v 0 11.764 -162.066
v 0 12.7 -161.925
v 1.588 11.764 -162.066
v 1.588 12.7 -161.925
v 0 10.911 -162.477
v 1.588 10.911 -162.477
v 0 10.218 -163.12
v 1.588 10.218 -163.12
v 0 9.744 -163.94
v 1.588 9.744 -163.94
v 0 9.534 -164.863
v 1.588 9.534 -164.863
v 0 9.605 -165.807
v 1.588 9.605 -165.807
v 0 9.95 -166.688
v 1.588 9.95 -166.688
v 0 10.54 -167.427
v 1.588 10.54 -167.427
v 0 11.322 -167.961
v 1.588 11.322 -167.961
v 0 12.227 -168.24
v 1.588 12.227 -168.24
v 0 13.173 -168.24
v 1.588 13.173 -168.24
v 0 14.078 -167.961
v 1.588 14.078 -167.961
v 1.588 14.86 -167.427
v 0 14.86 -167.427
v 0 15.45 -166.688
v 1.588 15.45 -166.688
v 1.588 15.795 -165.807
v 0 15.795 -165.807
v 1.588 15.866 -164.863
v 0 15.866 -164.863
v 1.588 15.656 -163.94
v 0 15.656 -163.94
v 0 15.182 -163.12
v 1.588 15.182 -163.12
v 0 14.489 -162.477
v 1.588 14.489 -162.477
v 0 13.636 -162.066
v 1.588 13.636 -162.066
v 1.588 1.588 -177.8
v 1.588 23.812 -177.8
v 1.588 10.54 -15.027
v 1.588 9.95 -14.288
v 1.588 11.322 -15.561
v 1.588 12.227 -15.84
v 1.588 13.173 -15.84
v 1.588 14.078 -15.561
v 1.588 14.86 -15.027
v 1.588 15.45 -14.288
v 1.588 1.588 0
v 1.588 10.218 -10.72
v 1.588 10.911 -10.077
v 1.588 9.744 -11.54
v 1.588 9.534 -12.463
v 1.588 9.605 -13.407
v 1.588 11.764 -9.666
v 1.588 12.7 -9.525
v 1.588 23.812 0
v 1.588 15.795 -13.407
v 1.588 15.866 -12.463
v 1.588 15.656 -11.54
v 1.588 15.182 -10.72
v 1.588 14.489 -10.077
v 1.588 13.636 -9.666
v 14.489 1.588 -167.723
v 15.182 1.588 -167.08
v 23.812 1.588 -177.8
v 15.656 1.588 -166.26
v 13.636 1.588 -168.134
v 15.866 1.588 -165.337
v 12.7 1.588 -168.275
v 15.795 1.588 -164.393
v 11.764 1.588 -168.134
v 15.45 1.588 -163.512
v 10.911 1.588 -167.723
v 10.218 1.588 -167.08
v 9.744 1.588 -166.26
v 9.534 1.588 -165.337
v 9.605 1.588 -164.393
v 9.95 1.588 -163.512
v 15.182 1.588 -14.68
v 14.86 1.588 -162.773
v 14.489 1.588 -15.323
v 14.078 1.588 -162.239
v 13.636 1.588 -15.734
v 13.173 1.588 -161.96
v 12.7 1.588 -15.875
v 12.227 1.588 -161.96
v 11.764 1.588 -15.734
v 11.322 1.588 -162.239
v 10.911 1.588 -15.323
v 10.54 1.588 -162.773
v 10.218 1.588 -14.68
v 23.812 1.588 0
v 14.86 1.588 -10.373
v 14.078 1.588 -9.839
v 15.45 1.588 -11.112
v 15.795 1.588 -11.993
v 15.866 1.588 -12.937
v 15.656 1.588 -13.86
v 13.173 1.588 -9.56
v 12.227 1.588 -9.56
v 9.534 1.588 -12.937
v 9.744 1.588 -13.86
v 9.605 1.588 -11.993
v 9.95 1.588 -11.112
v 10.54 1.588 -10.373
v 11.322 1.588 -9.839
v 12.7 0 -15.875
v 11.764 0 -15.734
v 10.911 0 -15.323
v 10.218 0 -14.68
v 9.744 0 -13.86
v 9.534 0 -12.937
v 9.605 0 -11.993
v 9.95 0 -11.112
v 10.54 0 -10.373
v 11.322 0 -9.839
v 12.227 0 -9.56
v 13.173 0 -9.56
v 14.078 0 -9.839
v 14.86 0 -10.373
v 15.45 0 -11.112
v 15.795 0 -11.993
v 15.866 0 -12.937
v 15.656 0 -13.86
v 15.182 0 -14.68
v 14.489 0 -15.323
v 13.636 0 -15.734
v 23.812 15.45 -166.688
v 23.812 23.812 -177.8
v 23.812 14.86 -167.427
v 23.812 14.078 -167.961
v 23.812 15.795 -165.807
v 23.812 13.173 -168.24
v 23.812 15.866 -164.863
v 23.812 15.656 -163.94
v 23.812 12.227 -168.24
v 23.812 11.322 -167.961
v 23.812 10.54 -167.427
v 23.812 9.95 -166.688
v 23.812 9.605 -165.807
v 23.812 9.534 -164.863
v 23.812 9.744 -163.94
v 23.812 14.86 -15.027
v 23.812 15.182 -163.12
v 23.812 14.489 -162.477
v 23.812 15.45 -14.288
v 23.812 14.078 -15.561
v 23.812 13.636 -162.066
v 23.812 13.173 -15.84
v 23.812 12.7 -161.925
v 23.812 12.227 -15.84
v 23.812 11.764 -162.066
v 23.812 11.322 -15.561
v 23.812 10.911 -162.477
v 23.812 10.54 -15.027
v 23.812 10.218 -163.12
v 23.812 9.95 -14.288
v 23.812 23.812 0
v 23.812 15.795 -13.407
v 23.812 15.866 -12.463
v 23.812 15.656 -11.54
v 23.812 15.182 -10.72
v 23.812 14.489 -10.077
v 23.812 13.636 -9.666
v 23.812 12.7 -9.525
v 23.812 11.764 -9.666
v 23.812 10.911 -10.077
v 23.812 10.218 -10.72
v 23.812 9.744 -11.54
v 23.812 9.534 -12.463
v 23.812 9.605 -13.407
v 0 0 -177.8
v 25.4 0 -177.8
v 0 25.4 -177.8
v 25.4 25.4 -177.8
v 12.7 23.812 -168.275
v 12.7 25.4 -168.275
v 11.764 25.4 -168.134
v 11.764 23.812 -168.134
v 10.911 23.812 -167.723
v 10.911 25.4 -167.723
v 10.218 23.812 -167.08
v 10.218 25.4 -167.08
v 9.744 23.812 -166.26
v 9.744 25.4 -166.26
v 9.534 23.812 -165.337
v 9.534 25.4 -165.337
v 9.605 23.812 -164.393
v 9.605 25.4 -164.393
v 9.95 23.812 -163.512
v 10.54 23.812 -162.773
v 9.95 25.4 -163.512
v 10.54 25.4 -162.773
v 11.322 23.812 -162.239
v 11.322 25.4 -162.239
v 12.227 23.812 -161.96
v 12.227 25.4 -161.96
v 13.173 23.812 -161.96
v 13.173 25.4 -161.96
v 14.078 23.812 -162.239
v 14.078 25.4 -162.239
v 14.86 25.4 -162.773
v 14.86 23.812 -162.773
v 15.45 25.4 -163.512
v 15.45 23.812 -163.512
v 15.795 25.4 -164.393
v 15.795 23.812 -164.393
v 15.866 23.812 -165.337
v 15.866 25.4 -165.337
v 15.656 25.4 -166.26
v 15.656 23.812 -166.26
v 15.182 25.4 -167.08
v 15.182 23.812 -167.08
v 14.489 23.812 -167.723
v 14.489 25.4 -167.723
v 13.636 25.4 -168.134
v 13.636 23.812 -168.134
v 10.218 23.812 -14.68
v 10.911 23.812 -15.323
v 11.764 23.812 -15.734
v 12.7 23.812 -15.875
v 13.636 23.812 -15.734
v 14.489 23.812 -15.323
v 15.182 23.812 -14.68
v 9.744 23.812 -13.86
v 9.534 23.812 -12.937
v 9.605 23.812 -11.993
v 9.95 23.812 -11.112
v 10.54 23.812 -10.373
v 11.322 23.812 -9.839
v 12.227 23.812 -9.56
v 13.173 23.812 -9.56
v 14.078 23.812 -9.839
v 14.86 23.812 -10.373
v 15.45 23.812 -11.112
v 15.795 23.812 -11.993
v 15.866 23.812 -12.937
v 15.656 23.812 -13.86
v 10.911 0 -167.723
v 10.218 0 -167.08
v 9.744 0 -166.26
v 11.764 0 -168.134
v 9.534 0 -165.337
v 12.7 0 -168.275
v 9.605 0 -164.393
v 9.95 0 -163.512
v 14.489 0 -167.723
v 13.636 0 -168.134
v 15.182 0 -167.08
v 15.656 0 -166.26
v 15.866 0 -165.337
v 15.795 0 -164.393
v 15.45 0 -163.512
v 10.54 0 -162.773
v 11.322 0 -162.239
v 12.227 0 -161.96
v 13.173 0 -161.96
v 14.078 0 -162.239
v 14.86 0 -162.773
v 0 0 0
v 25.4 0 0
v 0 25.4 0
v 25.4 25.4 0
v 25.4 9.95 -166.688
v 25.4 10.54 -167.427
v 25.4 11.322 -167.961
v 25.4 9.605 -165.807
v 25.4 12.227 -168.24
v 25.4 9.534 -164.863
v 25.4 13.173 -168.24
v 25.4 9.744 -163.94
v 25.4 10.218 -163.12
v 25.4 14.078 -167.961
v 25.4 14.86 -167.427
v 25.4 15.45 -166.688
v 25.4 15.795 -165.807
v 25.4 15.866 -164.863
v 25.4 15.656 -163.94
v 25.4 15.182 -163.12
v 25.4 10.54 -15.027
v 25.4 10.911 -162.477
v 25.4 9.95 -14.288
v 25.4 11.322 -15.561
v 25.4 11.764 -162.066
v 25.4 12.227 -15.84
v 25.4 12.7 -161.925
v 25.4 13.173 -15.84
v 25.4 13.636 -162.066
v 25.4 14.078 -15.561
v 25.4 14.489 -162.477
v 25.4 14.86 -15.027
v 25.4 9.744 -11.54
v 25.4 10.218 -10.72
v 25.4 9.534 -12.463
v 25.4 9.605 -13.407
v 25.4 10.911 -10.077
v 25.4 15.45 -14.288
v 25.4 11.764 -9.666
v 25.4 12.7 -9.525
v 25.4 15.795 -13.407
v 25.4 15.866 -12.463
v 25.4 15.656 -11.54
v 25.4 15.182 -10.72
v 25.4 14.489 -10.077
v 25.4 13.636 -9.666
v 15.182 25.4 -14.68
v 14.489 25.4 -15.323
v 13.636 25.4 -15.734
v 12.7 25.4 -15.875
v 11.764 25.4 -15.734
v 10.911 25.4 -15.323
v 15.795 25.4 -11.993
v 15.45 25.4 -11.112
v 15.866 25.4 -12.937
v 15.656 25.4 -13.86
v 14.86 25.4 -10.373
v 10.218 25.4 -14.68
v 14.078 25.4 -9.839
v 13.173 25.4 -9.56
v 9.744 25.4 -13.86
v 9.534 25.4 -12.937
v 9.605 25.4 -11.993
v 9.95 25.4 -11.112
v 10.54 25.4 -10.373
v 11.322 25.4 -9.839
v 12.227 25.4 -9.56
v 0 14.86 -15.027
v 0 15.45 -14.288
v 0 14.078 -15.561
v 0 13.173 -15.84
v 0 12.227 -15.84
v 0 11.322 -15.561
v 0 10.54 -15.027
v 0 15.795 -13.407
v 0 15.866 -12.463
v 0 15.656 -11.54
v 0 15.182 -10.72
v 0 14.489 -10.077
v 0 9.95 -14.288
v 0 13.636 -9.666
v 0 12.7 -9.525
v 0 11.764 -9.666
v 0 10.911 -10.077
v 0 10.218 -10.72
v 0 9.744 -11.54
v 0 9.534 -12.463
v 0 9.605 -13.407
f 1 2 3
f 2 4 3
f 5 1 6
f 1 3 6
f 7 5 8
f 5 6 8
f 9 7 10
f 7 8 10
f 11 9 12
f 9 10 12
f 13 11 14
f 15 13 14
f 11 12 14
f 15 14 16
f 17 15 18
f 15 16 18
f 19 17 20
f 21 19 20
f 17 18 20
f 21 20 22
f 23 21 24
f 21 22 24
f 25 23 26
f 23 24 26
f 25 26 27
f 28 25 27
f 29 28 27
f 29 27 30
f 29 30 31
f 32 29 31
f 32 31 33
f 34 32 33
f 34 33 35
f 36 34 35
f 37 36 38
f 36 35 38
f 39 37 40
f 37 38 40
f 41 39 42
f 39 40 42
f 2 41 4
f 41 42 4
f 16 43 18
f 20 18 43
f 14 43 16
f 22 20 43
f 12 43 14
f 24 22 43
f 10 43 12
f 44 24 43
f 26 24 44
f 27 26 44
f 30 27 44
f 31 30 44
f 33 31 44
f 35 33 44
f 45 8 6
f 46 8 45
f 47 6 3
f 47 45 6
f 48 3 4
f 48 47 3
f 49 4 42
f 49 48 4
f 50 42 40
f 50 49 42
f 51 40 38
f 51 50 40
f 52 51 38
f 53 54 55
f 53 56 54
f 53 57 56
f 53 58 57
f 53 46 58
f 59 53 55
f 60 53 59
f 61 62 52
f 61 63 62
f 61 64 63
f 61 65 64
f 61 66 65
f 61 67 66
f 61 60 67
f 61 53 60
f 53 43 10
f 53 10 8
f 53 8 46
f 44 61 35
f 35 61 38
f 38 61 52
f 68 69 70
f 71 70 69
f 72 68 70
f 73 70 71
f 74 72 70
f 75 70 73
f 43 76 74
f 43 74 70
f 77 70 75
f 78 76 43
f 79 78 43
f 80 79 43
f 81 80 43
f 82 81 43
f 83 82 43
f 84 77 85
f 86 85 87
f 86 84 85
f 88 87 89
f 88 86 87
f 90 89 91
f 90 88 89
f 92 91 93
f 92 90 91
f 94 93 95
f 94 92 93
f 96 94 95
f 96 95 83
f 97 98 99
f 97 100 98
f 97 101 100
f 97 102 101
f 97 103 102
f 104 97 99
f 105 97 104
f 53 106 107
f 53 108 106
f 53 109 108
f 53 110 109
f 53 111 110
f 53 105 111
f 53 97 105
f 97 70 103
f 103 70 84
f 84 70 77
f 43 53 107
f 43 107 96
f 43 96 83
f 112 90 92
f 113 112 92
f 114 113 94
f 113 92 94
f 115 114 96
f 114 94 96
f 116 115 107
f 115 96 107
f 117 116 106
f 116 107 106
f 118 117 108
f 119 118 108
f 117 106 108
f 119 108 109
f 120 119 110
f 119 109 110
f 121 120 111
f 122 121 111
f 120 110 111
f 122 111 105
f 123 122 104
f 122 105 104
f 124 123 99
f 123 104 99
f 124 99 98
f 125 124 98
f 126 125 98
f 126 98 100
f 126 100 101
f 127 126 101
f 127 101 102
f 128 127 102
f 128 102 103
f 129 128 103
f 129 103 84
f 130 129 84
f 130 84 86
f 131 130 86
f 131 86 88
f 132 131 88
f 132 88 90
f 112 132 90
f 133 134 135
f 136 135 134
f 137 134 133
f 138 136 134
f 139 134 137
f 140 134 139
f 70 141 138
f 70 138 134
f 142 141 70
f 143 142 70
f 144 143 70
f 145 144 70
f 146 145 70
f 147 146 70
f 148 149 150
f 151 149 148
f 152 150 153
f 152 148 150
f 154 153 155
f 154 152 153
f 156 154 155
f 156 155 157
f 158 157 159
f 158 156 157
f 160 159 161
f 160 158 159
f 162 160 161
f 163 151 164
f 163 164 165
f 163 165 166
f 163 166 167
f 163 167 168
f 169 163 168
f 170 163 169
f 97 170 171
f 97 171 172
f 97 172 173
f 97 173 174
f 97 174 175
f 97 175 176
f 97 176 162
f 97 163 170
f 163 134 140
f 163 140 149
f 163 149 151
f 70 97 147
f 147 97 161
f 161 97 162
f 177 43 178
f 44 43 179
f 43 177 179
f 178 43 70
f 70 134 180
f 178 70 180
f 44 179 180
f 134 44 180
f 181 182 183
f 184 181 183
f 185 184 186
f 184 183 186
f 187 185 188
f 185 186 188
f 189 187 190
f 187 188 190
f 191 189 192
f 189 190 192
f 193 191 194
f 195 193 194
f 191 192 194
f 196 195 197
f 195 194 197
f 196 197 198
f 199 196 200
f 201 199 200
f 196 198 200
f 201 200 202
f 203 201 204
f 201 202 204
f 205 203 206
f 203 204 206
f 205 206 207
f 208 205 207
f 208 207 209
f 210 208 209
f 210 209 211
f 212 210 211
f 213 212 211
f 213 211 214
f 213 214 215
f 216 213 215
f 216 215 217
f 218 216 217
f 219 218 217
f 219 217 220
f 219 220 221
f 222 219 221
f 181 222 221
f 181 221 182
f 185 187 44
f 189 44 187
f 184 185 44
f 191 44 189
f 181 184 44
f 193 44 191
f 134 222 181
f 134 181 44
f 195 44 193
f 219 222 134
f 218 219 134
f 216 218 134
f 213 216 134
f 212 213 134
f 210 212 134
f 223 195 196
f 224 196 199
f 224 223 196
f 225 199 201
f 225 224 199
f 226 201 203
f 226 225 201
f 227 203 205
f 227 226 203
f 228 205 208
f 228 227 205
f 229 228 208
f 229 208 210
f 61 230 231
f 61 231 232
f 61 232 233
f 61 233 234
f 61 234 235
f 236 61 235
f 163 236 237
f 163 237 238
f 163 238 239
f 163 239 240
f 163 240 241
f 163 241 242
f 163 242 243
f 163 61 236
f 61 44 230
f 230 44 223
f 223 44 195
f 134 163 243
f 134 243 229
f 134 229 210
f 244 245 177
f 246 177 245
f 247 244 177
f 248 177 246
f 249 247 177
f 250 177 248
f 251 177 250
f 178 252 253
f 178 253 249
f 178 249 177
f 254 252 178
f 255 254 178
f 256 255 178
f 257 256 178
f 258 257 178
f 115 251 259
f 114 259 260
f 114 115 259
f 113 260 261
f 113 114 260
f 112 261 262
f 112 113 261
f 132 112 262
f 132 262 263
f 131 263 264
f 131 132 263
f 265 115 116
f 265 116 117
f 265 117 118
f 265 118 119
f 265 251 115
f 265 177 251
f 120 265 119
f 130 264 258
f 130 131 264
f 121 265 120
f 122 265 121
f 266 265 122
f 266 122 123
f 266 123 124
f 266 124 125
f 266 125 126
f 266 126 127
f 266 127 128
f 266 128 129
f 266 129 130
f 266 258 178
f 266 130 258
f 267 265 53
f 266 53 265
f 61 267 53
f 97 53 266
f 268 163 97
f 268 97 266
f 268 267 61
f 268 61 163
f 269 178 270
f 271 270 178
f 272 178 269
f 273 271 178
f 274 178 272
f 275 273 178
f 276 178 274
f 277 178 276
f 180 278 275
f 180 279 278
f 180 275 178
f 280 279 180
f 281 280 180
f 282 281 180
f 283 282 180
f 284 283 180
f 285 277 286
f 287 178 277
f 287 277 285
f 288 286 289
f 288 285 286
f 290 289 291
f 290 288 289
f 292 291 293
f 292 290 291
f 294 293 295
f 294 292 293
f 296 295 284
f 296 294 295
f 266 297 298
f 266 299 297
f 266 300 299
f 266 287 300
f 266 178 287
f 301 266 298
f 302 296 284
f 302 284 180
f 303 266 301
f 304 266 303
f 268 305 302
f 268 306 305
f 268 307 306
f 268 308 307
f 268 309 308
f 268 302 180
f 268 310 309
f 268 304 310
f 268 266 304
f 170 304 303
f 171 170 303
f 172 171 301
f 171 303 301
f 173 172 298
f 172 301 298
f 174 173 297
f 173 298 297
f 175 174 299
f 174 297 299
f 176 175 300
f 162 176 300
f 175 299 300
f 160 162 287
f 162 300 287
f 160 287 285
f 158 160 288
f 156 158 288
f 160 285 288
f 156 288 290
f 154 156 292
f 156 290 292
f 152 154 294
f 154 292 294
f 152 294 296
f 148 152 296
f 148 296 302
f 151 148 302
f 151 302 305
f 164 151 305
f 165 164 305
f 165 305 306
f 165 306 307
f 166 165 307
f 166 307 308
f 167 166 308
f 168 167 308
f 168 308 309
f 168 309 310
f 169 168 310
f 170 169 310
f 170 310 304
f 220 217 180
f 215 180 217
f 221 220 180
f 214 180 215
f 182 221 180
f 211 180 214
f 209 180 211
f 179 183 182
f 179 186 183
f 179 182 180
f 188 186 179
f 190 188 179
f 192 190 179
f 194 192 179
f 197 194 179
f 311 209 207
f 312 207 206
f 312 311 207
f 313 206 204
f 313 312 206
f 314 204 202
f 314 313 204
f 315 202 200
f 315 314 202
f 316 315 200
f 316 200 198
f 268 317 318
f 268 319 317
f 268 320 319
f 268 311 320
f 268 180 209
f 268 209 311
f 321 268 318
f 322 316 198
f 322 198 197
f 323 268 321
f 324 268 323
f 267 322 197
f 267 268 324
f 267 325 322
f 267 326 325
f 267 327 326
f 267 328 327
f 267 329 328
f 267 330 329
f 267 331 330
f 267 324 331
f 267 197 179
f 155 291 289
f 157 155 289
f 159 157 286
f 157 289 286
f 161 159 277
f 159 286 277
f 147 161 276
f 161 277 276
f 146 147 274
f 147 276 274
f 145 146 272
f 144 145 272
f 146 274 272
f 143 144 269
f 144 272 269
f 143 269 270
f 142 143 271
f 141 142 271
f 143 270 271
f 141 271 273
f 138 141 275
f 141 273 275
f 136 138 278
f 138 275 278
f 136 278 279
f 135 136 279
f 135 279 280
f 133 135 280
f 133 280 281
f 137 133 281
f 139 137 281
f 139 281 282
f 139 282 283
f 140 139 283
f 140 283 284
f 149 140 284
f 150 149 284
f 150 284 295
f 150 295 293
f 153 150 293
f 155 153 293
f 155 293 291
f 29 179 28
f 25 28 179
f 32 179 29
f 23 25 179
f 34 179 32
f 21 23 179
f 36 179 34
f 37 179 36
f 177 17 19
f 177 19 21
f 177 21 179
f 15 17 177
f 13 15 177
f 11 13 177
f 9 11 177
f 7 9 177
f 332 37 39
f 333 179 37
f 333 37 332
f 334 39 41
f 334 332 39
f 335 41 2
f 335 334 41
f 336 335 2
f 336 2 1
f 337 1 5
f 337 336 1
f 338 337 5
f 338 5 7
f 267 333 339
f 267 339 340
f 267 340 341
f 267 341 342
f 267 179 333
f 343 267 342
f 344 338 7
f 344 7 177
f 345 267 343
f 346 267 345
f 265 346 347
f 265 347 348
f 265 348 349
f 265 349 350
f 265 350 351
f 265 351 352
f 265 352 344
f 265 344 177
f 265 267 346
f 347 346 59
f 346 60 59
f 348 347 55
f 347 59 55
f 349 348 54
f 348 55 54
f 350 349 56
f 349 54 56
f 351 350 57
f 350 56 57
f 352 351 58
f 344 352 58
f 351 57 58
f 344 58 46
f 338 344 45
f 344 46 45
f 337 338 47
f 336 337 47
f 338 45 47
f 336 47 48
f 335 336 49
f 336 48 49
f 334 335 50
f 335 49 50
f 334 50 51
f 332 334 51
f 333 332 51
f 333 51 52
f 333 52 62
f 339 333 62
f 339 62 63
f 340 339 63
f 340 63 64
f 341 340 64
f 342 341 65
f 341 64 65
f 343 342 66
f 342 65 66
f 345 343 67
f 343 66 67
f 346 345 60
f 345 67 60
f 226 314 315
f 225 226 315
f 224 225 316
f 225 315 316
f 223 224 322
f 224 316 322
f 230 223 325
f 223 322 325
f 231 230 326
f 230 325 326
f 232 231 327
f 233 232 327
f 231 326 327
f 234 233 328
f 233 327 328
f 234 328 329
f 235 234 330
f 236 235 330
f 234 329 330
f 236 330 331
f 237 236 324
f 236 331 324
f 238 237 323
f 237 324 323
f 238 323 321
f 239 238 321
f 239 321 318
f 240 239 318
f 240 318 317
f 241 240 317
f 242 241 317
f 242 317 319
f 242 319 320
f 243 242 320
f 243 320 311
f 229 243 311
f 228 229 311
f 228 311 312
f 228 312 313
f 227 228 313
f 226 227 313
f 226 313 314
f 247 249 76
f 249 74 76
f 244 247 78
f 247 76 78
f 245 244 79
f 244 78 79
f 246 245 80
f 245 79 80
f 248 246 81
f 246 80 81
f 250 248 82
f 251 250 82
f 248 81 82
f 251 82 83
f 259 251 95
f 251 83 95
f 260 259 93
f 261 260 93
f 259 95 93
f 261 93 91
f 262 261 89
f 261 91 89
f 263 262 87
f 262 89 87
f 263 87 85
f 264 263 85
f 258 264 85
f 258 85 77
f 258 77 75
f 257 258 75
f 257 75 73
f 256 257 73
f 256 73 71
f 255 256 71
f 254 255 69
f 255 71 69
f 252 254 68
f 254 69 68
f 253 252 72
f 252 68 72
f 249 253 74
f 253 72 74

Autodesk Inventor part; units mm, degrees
ref_plane "YZ Plane" through (0, 0, 0) normal (1, 0, 0) x (0, 1, 0)
ref_plane "XZ Plane" through (0, 0, 0) normal (0, 1, 0) x (-1, 0, 0)
ref_plane "XY Plane" through (0, 0, 0) normal (0, 0, 1) x (1, 0, 0)
sketch "Sketch1" plane through (0, 0, 0) normal (0, 0, 1) x (1, 0, 0)
  line L0 (0, 0) -> (25.4, 0)
  line L1 (25.4, 0) -> (25.4, 25.4)
  line L2 (25.4, 25.4) -> (0, 25.4)
  line L3 (0, 25.4) -> (0, 0)
  line L4 (1.5875, 23.8125) -> (23.8125, 23.8125)
  line L5 (23.8125, 23.8125) -> (23.8125, 1.5875)
  line L6 (23.8125, 1.5875) -> (1.5875, 1.5875)
  line L7 (1.5875, 1.5875) -> (1.5875, 23.8125)
  dimension "d0" = 25.4
  dimension "d1" = 25.4
  dimension "d2" = 1.5875
extrude "Extrusion1" add sketch "Sketch1" against normal blind 177.8
sketch "Sketch2" plane through (0, 0, 0) normal (0, -1, 0) x (1, 0, 0)
  line L0 (0, -177.8) -> (25.4, -177.8) projected
  line L1 (0, 0) -> (25.4, 0) projected
  point P0 (12.7, -12.7)
  point P1 (12.7, -165.1)
  dimension "d5" = 12.7
  dimension "d6" = 12.7
hole "Hole1" at (12.7, 0, -12.7) at (12.7, 0, -165.1) direction (0, 1, 0) diameter 6.35 depth 25.4 tip angle 118
sketch "Sketch3" plane through (0, 0, 0) normal (-1, 0, 0) x (0, 0, 1)
  line L0 (-177.8, 25.4) -> (-177.8, 0) projected
  line L1 (0, 25.4) -> (0, 0) projected
  point P0 (-12.7, 12.7)
  point P1 (-165.1, 12.7)
  dimension "d14" = 12.7
  dimension "d15" = 12.7
hole "Hole2" at (0, 12.7, -12.7) at (0, 12.7, -165.1) direction (1, 0, 0) diameter 6.35 depth 25.4 tip angle 118
properties part number "1tube_6_layer1_motorsupport"
